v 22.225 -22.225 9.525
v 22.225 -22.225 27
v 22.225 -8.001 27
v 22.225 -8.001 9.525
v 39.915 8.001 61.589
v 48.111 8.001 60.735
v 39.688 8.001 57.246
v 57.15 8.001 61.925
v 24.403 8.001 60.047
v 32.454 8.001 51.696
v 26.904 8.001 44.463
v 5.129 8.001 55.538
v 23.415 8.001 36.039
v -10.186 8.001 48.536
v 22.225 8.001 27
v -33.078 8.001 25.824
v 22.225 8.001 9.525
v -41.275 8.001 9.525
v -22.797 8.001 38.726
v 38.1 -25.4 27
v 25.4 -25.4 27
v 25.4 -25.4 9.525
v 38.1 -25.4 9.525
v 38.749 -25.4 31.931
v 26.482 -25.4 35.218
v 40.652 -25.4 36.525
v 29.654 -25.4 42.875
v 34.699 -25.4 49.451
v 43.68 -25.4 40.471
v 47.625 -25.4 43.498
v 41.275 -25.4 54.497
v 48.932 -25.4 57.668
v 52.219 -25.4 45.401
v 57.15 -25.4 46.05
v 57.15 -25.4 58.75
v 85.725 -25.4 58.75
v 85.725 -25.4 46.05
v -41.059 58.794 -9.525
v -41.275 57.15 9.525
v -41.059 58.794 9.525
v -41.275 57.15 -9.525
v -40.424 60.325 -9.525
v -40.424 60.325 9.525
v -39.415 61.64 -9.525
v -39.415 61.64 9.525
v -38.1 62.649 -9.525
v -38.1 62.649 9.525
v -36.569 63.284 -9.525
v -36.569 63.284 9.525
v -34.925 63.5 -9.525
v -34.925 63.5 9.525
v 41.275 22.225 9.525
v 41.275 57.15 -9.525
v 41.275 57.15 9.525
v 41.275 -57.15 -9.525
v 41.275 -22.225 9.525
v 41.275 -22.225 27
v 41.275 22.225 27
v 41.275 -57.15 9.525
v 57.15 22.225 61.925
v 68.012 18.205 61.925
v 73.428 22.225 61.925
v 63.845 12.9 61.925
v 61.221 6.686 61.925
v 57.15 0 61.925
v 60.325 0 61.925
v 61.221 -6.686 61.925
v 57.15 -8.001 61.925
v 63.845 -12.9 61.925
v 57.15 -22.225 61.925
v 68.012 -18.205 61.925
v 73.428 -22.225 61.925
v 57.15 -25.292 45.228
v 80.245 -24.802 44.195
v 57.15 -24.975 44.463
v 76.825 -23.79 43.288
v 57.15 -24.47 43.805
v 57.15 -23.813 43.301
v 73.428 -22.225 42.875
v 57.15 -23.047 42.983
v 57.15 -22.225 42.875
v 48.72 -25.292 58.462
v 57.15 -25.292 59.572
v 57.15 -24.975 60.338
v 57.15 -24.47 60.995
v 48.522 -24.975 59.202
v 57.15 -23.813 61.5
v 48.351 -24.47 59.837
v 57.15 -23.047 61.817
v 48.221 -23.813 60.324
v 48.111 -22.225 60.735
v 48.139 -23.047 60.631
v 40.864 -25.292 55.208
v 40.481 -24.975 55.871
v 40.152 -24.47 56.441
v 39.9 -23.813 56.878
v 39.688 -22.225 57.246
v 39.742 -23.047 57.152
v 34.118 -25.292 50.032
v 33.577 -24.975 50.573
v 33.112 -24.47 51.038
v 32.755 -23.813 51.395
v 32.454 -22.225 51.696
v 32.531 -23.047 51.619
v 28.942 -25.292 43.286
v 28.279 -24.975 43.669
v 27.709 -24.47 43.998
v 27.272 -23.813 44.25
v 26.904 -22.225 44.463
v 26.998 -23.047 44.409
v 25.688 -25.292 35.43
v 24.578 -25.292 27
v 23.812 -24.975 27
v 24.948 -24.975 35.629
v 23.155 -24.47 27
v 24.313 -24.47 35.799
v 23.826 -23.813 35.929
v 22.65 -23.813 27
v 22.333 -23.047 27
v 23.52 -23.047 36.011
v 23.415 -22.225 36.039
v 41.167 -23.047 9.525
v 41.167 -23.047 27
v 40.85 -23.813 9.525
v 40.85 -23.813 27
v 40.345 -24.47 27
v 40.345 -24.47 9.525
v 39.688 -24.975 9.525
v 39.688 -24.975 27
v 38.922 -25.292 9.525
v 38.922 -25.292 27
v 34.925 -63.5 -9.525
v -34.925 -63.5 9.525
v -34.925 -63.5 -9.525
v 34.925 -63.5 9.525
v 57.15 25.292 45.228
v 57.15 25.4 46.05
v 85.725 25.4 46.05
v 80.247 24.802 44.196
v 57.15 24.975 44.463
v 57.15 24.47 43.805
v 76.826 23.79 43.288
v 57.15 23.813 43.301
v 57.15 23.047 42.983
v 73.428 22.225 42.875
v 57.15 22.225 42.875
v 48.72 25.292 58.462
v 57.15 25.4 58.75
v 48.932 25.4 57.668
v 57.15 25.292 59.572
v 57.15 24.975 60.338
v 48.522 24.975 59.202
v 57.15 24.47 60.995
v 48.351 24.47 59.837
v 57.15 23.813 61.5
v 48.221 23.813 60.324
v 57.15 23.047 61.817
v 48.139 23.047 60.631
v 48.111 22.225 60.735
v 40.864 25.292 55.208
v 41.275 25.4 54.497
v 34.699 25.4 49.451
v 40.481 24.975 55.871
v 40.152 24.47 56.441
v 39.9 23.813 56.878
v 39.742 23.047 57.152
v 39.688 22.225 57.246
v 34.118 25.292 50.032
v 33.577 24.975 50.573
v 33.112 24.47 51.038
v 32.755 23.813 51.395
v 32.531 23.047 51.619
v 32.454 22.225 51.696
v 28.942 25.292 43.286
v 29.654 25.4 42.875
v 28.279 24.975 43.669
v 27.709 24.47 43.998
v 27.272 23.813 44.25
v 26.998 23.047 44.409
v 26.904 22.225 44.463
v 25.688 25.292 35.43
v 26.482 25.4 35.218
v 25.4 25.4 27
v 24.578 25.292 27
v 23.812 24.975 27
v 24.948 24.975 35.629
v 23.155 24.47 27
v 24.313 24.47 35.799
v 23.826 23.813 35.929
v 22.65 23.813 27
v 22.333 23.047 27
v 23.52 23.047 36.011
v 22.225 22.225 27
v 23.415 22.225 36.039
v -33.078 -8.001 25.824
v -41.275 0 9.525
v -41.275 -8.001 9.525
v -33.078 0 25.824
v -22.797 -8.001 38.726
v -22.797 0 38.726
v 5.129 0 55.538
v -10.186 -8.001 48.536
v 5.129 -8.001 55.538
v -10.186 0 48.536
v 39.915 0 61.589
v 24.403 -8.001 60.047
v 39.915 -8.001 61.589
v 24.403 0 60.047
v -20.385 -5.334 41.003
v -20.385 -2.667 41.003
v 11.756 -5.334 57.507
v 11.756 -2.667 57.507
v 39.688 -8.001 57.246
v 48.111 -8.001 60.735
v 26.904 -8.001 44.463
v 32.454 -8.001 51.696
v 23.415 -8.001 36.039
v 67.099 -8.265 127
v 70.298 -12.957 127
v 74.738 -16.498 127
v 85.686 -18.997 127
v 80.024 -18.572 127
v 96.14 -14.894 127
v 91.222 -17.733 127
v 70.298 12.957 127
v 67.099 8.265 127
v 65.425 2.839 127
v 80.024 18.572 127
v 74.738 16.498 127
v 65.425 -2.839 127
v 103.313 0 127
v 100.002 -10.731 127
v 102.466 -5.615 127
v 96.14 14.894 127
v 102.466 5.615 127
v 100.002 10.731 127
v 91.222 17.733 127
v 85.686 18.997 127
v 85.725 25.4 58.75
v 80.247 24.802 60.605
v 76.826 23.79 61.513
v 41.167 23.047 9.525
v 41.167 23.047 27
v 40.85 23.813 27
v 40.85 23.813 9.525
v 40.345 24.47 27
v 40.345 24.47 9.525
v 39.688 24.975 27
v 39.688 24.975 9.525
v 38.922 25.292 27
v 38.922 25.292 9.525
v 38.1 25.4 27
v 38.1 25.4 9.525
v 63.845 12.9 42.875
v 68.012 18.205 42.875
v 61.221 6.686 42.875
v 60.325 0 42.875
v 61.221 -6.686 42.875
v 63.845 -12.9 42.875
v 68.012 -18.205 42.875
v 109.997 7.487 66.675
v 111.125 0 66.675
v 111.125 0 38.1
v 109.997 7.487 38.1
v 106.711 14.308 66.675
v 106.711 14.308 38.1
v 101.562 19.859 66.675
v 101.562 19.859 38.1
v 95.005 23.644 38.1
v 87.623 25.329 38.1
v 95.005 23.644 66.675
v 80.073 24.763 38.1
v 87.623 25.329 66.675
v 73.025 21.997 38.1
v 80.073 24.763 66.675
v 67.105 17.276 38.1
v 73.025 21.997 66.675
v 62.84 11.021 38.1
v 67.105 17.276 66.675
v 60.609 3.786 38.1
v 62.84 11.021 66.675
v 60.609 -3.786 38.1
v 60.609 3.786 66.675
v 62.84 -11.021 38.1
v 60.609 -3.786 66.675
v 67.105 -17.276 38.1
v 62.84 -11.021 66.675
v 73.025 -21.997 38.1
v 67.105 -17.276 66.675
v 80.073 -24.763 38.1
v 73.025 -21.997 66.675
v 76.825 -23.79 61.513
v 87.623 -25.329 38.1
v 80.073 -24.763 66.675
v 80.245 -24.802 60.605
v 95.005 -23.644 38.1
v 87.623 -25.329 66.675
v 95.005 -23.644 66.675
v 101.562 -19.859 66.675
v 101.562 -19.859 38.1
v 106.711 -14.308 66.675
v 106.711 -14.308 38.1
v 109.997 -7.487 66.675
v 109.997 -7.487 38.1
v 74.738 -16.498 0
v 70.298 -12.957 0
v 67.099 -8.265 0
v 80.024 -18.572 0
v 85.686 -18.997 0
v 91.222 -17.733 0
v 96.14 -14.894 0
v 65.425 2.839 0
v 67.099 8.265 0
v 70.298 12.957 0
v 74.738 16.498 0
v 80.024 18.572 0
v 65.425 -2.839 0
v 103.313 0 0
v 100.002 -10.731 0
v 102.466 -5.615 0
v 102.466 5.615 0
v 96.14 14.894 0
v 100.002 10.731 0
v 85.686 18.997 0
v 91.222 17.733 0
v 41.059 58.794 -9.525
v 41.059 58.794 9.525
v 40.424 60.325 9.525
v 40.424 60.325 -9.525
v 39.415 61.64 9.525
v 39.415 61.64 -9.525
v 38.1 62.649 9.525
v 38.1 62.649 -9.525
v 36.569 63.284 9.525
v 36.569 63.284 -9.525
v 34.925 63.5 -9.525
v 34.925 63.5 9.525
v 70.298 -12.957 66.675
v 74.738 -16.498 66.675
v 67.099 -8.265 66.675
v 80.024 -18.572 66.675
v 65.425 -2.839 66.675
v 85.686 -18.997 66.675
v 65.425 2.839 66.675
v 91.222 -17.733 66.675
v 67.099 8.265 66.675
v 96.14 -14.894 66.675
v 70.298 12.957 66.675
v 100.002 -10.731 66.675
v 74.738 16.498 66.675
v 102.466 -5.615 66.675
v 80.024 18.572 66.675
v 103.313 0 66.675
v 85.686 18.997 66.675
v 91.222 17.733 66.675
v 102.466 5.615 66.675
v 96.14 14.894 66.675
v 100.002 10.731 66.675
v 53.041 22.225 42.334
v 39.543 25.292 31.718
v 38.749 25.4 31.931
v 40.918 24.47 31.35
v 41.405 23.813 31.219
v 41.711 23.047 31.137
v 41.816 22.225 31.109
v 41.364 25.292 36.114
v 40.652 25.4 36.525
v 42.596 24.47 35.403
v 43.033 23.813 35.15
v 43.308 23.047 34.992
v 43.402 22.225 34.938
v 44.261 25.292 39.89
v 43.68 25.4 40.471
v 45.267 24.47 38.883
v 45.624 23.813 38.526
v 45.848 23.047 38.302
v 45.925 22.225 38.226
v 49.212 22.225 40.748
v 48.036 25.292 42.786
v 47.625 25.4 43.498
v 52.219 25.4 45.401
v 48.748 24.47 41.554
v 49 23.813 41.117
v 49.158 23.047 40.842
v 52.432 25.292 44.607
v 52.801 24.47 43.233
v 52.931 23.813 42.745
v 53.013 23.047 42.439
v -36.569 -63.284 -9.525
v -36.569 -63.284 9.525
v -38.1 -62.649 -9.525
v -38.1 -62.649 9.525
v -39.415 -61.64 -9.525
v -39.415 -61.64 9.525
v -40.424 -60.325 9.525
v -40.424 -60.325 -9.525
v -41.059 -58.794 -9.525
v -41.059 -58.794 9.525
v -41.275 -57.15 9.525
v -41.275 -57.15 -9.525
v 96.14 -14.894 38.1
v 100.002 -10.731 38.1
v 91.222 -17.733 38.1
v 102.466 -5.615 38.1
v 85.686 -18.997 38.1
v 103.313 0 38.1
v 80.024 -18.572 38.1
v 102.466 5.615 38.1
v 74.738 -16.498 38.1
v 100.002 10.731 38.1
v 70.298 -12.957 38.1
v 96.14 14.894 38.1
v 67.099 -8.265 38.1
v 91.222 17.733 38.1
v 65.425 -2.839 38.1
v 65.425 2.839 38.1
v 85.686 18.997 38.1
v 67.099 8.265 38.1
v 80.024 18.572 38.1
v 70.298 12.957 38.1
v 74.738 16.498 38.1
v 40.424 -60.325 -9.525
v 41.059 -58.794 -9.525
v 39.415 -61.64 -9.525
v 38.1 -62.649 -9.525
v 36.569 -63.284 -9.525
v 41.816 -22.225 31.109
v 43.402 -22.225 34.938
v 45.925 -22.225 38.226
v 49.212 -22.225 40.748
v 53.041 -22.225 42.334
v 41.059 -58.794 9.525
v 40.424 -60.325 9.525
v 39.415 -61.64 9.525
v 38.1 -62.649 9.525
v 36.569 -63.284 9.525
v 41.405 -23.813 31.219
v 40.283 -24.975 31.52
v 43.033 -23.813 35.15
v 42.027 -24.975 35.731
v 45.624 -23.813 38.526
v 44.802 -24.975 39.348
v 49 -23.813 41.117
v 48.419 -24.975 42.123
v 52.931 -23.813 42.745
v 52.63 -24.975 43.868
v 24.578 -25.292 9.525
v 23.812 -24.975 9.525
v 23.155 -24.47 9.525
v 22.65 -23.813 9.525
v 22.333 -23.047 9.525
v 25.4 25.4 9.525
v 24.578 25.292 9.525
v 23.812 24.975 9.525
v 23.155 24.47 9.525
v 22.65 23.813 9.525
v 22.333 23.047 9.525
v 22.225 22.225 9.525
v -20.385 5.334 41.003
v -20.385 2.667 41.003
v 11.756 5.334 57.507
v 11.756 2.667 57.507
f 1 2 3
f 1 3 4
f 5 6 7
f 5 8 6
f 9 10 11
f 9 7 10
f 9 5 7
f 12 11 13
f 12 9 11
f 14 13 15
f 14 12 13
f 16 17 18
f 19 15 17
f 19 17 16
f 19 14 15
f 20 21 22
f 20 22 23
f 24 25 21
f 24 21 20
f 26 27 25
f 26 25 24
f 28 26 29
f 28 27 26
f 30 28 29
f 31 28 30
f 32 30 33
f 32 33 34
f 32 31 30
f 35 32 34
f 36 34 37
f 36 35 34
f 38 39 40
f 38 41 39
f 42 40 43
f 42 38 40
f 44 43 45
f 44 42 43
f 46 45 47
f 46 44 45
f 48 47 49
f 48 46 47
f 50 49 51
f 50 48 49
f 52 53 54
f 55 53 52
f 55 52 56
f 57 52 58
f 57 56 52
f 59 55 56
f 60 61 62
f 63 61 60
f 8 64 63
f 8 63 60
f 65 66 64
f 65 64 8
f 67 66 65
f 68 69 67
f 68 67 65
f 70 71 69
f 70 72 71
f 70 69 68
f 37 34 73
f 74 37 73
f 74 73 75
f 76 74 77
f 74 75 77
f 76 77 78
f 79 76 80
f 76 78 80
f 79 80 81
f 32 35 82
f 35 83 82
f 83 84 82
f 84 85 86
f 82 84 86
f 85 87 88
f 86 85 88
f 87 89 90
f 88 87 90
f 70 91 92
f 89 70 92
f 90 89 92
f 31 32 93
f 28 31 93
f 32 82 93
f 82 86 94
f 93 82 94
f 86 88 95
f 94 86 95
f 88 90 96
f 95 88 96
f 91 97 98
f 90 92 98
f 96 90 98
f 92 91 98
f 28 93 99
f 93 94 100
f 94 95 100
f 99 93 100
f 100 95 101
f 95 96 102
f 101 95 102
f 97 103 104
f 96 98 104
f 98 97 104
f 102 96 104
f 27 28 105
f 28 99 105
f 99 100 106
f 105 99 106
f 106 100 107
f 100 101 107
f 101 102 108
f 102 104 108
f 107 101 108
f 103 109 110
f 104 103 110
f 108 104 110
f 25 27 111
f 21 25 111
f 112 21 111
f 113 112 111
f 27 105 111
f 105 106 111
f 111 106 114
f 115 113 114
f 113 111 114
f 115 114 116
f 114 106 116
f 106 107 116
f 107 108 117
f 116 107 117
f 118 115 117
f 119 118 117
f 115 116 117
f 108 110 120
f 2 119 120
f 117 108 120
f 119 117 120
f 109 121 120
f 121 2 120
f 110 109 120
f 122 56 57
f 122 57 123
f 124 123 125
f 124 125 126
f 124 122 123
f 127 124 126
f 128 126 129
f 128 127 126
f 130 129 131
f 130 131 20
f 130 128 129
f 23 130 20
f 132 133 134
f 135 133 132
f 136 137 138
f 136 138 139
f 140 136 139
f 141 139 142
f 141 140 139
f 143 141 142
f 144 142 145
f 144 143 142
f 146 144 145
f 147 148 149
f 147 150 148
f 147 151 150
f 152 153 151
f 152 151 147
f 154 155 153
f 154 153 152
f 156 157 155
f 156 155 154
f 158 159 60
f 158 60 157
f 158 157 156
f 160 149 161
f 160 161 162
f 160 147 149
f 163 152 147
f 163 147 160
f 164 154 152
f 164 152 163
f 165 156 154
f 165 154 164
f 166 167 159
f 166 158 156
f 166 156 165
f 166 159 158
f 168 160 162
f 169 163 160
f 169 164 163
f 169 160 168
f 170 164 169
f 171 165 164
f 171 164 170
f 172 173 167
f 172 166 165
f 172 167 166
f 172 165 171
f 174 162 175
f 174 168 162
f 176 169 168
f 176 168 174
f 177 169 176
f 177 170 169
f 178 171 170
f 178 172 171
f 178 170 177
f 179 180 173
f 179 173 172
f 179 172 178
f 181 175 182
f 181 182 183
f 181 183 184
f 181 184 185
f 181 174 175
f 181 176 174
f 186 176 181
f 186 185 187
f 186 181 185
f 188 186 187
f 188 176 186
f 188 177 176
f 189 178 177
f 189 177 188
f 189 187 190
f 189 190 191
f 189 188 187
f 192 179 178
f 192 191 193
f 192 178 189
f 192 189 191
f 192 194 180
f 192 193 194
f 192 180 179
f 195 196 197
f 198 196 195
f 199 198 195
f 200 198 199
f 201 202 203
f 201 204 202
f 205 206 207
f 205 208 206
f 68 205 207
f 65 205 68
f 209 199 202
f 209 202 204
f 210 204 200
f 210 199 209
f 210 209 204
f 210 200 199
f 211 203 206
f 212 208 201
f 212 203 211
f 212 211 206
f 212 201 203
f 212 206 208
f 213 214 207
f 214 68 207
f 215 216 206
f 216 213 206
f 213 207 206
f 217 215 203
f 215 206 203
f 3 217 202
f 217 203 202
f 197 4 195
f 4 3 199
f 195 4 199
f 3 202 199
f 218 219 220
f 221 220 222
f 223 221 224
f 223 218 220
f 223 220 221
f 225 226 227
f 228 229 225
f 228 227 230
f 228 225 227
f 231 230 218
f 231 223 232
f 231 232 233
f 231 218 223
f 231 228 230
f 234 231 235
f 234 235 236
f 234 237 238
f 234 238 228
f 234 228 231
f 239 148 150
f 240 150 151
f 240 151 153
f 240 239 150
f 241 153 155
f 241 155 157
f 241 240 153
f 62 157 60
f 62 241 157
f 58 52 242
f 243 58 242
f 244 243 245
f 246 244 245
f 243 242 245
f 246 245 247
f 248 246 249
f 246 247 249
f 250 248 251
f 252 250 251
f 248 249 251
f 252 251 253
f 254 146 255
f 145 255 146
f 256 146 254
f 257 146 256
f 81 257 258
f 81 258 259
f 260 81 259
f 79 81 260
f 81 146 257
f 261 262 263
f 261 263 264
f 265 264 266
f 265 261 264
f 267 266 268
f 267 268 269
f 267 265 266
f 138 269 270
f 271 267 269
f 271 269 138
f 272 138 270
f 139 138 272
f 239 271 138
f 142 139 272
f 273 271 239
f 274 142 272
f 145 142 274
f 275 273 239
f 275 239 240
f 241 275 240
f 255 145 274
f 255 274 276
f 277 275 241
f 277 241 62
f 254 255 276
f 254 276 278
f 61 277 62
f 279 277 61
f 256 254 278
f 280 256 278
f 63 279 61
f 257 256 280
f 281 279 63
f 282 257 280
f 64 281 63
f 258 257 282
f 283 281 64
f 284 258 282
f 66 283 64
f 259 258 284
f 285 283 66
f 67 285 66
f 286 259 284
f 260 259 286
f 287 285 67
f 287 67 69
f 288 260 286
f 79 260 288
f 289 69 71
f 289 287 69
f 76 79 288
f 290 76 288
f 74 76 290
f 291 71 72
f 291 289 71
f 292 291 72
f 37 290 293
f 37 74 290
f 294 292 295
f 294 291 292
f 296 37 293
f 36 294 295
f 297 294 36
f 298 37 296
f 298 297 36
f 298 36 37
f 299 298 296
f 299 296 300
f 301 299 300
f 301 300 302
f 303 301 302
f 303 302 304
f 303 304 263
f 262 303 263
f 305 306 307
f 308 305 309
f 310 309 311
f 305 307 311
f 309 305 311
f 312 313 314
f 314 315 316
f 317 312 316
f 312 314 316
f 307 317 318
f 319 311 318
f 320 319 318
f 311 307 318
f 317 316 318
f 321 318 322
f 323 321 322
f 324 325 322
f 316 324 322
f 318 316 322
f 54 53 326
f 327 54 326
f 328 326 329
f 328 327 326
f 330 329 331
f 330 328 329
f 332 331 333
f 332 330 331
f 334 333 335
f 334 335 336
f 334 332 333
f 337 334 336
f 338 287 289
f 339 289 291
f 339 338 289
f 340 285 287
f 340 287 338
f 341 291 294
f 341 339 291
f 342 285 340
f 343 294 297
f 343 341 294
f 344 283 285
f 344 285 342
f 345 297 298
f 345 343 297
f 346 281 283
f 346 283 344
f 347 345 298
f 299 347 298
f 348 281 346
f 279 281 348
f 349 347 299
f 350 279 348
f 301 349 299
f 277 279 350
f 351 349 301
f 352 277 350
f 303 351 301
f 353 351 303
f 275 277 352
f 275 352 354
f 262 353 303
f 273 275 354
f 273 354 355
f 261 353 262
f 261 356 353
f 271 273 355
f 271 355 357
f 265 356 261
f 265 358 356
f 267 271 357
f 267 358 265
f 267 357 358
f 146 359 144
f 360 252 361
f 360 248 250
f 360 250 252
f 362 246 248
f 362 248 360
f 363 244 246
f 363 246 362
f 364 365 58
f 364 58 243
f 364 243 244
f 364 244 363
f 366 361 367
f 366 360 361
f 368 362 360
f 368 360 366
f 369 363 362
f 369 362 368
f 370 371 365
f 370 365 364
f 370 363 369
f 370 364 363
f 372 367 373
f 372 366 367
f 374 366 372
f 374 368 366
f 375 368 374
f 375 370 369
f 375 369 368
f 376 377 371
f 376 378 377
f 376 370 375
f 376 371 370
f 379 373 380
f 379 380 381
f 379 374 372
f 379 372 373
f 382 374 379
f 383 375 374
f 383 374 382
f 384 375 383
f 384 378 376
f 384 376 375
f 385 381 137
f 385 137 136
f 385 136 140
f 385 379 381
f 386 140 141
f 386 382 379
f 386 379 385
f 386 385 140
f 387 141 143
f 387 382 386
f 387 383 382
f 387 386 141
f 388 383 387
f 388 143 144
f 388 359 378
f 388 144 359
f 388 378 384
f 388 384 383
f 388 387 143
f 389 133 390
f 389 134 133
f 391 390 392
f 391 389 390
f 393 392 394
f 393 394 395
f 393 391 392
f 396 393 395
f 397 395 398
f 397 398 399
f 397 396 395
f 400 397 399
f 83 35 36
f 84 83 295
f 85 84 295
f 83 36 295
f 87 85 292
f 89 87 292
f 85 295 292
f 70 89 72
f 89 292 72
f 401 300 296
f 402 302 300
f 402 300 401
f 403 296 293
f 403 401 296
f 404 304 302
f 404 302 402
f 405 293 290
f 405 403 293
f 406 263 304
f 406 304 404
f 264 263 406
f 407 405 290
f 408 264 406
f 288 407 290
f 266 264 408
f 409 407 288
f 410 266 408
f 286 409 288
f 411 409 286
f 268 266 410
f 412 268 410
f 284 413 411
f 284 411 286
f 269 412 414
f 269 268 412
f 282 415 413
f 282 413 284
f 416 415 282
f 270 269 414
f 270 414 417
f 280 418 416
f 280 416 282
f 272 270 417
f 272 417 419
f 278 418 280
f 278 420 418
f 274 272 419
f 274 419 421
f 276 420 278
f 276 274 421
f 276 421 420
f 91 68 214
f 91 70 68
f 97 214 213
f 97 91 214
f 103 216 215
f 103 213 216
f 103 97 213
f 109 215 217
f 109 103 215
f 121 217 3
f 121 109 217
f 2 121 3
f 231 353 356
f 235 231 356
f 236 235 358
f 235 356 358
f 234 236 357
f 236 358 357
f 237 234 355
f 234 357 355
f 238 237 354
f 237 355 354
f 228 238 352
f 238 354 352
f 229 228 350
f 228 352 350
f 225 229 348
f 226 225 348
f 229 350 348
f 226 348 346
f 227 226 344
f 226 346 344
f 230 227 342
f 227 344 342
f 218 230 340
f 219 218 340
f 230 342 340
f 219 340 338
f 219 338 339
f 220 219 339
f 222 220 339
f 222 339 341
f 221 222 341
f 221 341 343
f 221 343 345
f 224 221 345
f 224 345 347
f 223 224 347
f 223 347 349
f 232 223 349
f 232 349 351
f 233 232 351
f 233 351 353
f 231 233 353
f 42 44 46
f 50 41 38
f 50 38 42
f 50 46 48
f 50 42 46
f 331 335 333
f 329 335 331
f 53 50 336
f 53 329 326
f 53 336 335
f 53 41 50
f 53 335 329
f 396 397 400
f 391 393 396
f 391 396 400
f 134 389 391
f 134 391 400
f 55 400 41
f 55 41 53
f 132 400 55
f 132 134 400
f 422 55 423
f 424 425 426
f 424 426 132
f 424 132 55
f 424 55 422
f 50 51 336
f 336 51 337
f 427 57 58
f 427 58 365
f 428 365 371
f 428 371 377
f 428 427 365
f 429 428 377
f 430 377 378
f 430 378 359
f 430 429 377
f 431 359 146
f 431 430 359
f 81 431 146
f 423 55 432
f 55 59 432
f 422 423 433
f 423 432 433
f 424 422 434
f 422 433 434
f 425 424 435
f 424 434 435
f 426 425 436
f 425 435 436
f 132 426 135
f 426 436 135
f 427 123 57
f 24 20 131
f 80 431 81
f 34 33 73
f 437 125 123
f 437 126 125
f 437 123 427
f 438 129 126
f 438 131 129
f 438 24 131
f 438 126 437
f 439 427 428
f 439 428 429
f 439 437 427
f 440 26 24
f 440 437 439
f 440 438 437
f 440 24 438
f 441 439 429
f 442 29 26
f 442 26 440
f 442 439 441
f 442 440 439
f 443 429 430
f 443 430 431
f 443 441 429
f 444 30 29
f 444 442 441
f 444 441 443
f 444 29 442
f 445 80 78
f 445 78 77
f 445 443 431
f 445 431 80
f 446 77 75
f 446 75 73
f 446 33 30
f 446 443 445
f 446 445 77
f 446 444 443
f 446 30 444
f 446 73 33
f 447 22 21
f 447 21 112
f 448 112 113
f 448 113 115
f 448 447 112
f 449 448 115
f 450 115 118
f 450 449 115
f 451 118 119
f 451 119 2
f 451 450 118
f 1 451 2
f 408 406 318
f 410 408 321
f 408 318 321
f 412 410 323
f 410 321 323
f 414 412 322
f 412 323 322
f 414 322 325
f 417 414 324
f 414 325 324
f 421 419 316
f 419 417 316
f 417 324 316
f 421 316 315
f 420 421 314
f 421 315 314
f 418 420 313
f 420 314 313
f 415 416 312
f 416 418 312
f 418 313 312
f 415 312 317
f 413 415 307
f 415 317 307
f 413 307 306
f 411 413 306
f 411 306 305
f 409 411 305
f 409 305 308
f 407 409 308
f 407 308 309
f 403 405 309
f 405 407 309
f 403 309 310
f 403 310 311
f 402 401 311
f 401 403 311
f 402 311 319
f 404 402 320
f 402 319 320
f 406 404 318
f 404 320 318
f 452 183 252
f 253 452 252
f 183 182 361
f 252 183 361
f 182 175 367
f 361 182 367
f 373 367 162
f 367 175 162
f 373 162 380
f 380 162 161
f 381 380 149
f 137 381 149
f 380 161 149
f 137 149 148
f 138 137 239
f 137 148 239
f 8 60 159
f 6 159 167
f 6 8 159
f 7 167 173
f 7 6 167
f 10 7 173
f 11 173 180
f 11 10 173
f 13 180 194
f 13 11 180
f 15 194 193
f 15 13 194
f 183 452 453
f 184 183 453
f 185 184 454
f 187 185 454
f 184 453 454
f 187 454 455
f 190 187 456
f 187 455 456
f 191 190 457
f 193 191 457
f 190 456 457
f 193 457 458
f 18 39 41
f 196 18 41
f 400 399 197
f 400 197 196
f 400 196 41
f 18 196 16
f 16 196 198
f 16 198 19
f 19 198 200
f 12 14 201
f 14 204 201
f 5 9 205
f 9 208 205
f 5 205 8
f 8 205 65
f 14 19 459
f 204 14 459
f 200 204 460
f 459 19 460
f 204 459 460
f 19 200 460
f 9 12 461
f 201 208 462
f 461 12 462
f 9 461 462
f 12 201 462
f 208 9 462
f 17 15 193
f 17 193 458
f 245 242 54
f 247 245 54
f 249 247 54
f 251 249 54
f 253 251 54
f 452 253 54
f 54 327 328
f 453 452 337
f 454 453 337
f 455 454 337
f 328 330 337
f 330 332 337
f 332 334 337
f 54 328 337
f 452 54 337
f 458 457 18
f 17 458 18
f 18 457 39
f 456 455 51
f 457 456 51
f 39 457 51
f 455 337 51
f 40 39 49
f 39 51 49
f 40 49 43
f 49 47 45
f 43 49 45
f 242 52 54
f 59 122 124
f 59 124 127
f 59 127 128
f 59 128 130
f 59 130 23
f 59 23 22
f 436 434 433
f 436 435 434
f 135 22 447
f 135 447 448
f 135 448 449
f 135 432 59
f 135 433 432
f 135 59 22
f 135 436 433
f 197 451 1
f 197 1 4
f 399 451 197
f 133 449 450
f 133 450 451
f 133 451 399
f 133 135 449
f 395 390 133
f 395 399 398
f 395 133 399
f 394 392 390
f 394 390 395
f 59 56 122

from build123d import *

# Parameters (mm, degrees)
F2_DEPTH     = 63.5
F0_W         = 25.4
F0_H         = 19.05
F3_DEPTH     = 25.4
F4_DEPTH     = 8.001
F6_R         = 6.35
F7_T1_DEPTH  = 17.4752
F7_T4_ANGLE  = 90
F7_T8_DEPTH  = 42.06875
F7_S9_R      = 25.4
F7_T10_DEPTH = 23
F7_T12_ANGLE = 90
F7_T14_ANGLE = 90
F7_T18_DEPTH = 42.06875
F7_S19_R     = 25.4
F7_T20_DEPTH = 23
F7_T22_ANGLE = 90
F7_T26_DEPTH = 42.06875
F7_S27_R     = 25.4
F7_T28_DEPTH = 23
F7_T32_DEPTH = 42.06875
F7_S33_R     = 25.4
F7_T34_DEPTH = 23
F8_R         = 19.05
F9_DEPTH     = 127


# Not quite as in the source:
# - a fillet or chamfer that OpenCascade refuses, or shapes differently, is made with other operations: its cross-section is extruded or revolved along the edge and cut away or added


with BuildPart() as f2:
    # F0 (on Front) → F2 (new body, symmetric)
    with BuildSketch(Plane.XZ):
        Polygon((22.225, 9.525), (-41.275, 9.525), (-41.275, -9.525), (41.275, -9.525), (41.275, 9.525), align=None)
    extrude(amount=F2_DEPTH, both=True)

    # F0 (on Front) → F3 (join, symmetric)
    with BuildSketch(Plane.XZ):
        with BuildLine():
            Line((22.225, 27.0002), (22.225, 9.525))
            Line((22.225, 9.525), (41.275, 9.525))
            Line((41.275, 9.525), (41.275, 27.0002))
            ThreePointArc((41.275, 27.0002), (45.9246798487, 38.2255201513), (57.15, 42.8752))
            Line((57.15, 42.8752), (60.325, 42.8752))
            Line((60.325, 42.8752), (60.325, 61.9252))
            Line((60.325, 61.9252), (57.15, 61.9252))
            ThreePointArc((57.15, 61.9252), (32.4542956671, 51.6959043329), (22.225, 27.0002))
        make_face()
        with Locations((73.025, 52.4002)):
            Rectangle(F0_W, F0_H)
    extrude(amount=F3_DEPTH, both=True)

    # F0 (on Front) → F4 (join, symmetric)
    with BuildSketch(Plane.XZ):
        with BuildLine():
            add(Edge.make_bspline(
                [(-41.275, 9.525), (-25.3429859877, 49.4523830712), (4.4616423547, 62.58662045), (57.15, 61.9252)],
                knots=[0, 0, 0, 0, 111.5045361635, 111.5045361635, 111.5045361635, 111.5045361635], degree=3))
            Line((-41.275, 9.525), (22.225, 9.525))
            Line((22.225, 9.525), (22.225, 27.0002))
            ThreePointArc((22.225, 27.0002), (32.4542956671, 51.6959043329), (57.15, 61.9252))
        make_face()
    extrude(amount=F4_DEPTH, both=True)

    # F0 (on Front) → F5 (revolve)
    with BuildSketch(Plane.XZ):
        Polygon((85.725, 66.675), (85.725, 61.9252), (85.725, 42.8752), (85.725, 38.1), (111.125, 38.1), (111.125, 66.675), align=None)
    revolve(axis=Axis((85.725, 0, 52.3875), (0, 0, 1)))

    # F6
    f6_edges = [f2.edges().sort_by_distance(p)[0] for p in [
        (41.275, -63.5, 0),
        (-41.275, -63.5, 0),
        (41.275, 63.5, 0),
        (-41.275, 63.5, 0),
    ]]
    fillet(f6_edges, radius=F6_R)

    # F7: fillet of radius 3.175 on 12 edges, made by hand

    # F7_s2 → F7_t1 (cut)
    with BuildSketch(Plane.XY.offset(9.525)):
        with BuildLine():
            ThreePointArc((25.4, -25.4), (23.1549359697, -24.4700640303), (22.225, -22.225))
            Line((22.225, -22.225), (22.225, -25.4))
            Line((22.225, -25.4), (25.4, -25.4))
        make_face()
        with BuildLine():
            ThreePointArc((41.275, -22.225), (40.3450640303, -24.4700640303), (38.1, -25.4))
            Line((38.1, -25.4), (41.275, -25.4))
            Line((41.275, -25.4), (41.275, -22.225))
        make_face()
        with BuildLine():
            ThreePointArc((25.4, 25.4), (23.1549359697, 24.4700640303), (22.225, 22.225))
            Line((22.225, 22.225), (22.225, 25.4))
            Line((22.225, 25.4), (25.4, 25.4))
        make_face()
        with BuildLine():
            ThreePointArc((41.275, 22.225), (40.3450640303, 24.4700640303), (38.1, 25.4))
            Line((38.1, 25.4), (41.275, 25.4))
            Line((41.275, 25.4), (41.275, 22.225))
        make_face()
    extrude(amount=F7_T1_DEPTH, mode=Mode.SUBTRACT)

    # F7_s3 → F7_t4 (revolve, cut)
    with BuildSketch(Plane.YZ.offset(57.15)):
        with BuildLine():
            ThreePointArc((-25.4, 58.7502), (-24.4700640303, 60.9952640303), (-22.225, 61.9252))
            Line((-22.225, 61.9252), (-25.4, 61.9252))
            Line((-25.4, 61.9252), (-25.4, 58.7502))
        make_face()
    revolve(axis=Axis((57.15, -25.4, 27.0002), (0, -1, 0)), revolution_arc=F7_T4_ANGLE, mode=Mode.SUBTRACT)


with BuildPart() as f7_tool6:
    # F7_s7 → F7_t8 (new body)
    with BuildSketch(Plane.YZ.offset(99.21875)):
        with BuildLine():
            ThreePointArc((-25.4, 58.7502), (-24.4700640303, 60.9952640303), (-22.225, 61.9252))
            Line((-22.225, 61.9252), (-25.4, 61.9252))
            Line((-25.4, 61.9252), (-25.4, 58.7502))
        make_face()
    extrude(amount=-F7_T8_DEPTH)

    # F7_s9 → F7_t10 (cut, symmetric)
    with BuildSketch(Plane.XY.offset(60.3)):
        with Locations((85.725, 0)):
            Circle(F7_S9_R)
    extrude(amount=F7_T10_DEPTH, both=True, mode=Mode.SUBTRACT)


with BuildPart() as f2_1:
    add(f2.part)

    # F7_t5: cut F7_tool6
    add(f7_tool6.part, mode=Mode.SUBTRACT)

    # F7_s11 → F7_t12 (revolve, cut)
    with BuildSketch(Plane.XY.offset(27.0002)):
        with BuildLine():
            ThreePointArc((41.275, -22.225), (40.3450640303, -24.4700640303), (38.1, -25.4))
            Line((38.1, -25.4), (41.275, -25.4))
            Line((41.275, -25.4), (41.275, -22.225))
        make_face()
    revolve(axis=Axis((57.15, -25.4, 27.0002), (0, 1, 0)), revolution_arc=F7_T12_ANGLE, mode=Mode.SUBTRACT)

    # F7_s13 → F7_t14 (revolve, cut)
    with BuildSketch(Plane.YZ.offset(57.15)):
        with BuildLine():
            ThreePointArc((25.4, 58.7502), (24.4700640303, 60.9952640303), (22.225, 61.9252))
            Line((22.225, 61.9252), (25.4, 61.9252))
            Line((25.4, 61.9252), (25.4, 58.7502))
        make_face()
    revolve(axis=Axis((57.15, 25.4, 27.0002), (0, -1, 0)), revolution_arc=F7_T14_ANGLE, mode=Mode.SUBTRACT)


with BuildPart() as f7_tool16:
    # F7_s17 → F7_t18 (new body)
    with BuildSketch(Plane.YZ.offset(99.21875)):
        with BuildLine():
            ThreePointArc((25.4, 58.7502), (24.4700640303, 60.9952640303), (22.225, 61.9252))
            Line((22.225, 61.9252), (25.4, 61.9252))
            Line((25.4, 61.9252), (25.4, 58.7502))
        make_face()
    extrude(amount=-F7_T18_DEPTH)

    # F7_s19 → F7_t20 (cut, symmetric)
    with BuildSketch(Plane.XY.offset(60.3)):
        with Locations((85.725, 0)):
            Circle(F7_S19_R)
    extrude(amount=F7_T20_DEPTH, both=True, mode=Mode.SUBTRACT)


with BuildPart() as f2_2:
    add(f2_1.part)

    # F7_t15: cut F7_tool16
    add(f7_tool16.part, mode=Mode.SUBTRACT)

    # F7_s21 → F7_t22 (revolve, cut)
    with BuildSketch(Plane.XY.offset(27.0002)):
        with BuildLine():
            ThreePointArc((38.1, 25.4), (40.3450640303, 24.4700640303), (41.275, 22.225))
            Line((41.275, 22.225), (41.275, 25.4))
            Line((41.275, 25.4), (38.1, 25.4))
        make_face()
    revolve(axis=Axis((57.15, 25.4, 27.0002), (0, 1, 0)), revolution_arc=F7_T22_ANGLE, mode=Mode.SUBTRACT)


with BuildPart() as f7_tool24:
    # F7_s25 → F7_t26 (new body)
    with BuildSketch(Plane.YZ.offset(57.15)):
        with BuildLine():
            ThreePointArc((25.4, 46.0502), (24.4700640303, 43.8051359697), (22.225, 42.8752))
            Line((22.225, 42.8752), (25.4, 42.8752))
            Line((25.4, 42.8752), (25.4, 46.0502))
        make_face()
    extrude(amount=F7_T26_DEPTH)

    # F7_s27 → F7_t28 (cut, symmetric)
    with BuildSketch(Plane.XY.offset(44.5)):
        with Locations((85.725, 0)):
            Circle(F7_S27_R)
    extrude(amount=F7_T28_DEPTH, both=True, mode=Mode.SUBTRACT)


with BuildPart() as f2_3:
    add(f2_2.part)

    # F7_t23: cut F7_tool24
    add(f7_tool24.part, mode=Mode.SUBTRACT)


with BuildPart() as f7_tool30:
    # F7_s31 → F7_t32 (new body)
    with BuildSketch(Plane.YZ.offset(57.15)):
        with BuildLine():
            ThreePointArc((-25.4, 46.0502), (-24.4700640303, 43.8051359697), (-22.225, 42.8752))
            Line((-22.225, 42.8752), (-25.4, 42.8752))
            Line((-25.4, 42.8752), (-25.4, 46.0502))
        make_face()
    extrude(amount=F7_T32_DEPTH)

    # F7_s33 → F7_t34 (cut, symmetric)
    with BuildSketch(Plane.XY.offset(44.5)):
        with Locations((85.725, 0)):
            Circle(F7_S33_R)
    extrude(amount=F7_T34_DEPTH, both=True, mode=Mode.SUBTRACT)


with BuildPart() as f2_4:
    add(f2_3.part)

    # F7_t29: cut F7_tool30
    add(f7_tool30.part, mode=Mode.SUBTRACT)

    # F8 (on Top) → F9 (join)
    with BuildSketch(Plane.XY):
        with Locations((84.2625681776, 0)):
            Circle(F8_R)
    extrude(amount=F9_DEPTH)


solid = f2_4.part
